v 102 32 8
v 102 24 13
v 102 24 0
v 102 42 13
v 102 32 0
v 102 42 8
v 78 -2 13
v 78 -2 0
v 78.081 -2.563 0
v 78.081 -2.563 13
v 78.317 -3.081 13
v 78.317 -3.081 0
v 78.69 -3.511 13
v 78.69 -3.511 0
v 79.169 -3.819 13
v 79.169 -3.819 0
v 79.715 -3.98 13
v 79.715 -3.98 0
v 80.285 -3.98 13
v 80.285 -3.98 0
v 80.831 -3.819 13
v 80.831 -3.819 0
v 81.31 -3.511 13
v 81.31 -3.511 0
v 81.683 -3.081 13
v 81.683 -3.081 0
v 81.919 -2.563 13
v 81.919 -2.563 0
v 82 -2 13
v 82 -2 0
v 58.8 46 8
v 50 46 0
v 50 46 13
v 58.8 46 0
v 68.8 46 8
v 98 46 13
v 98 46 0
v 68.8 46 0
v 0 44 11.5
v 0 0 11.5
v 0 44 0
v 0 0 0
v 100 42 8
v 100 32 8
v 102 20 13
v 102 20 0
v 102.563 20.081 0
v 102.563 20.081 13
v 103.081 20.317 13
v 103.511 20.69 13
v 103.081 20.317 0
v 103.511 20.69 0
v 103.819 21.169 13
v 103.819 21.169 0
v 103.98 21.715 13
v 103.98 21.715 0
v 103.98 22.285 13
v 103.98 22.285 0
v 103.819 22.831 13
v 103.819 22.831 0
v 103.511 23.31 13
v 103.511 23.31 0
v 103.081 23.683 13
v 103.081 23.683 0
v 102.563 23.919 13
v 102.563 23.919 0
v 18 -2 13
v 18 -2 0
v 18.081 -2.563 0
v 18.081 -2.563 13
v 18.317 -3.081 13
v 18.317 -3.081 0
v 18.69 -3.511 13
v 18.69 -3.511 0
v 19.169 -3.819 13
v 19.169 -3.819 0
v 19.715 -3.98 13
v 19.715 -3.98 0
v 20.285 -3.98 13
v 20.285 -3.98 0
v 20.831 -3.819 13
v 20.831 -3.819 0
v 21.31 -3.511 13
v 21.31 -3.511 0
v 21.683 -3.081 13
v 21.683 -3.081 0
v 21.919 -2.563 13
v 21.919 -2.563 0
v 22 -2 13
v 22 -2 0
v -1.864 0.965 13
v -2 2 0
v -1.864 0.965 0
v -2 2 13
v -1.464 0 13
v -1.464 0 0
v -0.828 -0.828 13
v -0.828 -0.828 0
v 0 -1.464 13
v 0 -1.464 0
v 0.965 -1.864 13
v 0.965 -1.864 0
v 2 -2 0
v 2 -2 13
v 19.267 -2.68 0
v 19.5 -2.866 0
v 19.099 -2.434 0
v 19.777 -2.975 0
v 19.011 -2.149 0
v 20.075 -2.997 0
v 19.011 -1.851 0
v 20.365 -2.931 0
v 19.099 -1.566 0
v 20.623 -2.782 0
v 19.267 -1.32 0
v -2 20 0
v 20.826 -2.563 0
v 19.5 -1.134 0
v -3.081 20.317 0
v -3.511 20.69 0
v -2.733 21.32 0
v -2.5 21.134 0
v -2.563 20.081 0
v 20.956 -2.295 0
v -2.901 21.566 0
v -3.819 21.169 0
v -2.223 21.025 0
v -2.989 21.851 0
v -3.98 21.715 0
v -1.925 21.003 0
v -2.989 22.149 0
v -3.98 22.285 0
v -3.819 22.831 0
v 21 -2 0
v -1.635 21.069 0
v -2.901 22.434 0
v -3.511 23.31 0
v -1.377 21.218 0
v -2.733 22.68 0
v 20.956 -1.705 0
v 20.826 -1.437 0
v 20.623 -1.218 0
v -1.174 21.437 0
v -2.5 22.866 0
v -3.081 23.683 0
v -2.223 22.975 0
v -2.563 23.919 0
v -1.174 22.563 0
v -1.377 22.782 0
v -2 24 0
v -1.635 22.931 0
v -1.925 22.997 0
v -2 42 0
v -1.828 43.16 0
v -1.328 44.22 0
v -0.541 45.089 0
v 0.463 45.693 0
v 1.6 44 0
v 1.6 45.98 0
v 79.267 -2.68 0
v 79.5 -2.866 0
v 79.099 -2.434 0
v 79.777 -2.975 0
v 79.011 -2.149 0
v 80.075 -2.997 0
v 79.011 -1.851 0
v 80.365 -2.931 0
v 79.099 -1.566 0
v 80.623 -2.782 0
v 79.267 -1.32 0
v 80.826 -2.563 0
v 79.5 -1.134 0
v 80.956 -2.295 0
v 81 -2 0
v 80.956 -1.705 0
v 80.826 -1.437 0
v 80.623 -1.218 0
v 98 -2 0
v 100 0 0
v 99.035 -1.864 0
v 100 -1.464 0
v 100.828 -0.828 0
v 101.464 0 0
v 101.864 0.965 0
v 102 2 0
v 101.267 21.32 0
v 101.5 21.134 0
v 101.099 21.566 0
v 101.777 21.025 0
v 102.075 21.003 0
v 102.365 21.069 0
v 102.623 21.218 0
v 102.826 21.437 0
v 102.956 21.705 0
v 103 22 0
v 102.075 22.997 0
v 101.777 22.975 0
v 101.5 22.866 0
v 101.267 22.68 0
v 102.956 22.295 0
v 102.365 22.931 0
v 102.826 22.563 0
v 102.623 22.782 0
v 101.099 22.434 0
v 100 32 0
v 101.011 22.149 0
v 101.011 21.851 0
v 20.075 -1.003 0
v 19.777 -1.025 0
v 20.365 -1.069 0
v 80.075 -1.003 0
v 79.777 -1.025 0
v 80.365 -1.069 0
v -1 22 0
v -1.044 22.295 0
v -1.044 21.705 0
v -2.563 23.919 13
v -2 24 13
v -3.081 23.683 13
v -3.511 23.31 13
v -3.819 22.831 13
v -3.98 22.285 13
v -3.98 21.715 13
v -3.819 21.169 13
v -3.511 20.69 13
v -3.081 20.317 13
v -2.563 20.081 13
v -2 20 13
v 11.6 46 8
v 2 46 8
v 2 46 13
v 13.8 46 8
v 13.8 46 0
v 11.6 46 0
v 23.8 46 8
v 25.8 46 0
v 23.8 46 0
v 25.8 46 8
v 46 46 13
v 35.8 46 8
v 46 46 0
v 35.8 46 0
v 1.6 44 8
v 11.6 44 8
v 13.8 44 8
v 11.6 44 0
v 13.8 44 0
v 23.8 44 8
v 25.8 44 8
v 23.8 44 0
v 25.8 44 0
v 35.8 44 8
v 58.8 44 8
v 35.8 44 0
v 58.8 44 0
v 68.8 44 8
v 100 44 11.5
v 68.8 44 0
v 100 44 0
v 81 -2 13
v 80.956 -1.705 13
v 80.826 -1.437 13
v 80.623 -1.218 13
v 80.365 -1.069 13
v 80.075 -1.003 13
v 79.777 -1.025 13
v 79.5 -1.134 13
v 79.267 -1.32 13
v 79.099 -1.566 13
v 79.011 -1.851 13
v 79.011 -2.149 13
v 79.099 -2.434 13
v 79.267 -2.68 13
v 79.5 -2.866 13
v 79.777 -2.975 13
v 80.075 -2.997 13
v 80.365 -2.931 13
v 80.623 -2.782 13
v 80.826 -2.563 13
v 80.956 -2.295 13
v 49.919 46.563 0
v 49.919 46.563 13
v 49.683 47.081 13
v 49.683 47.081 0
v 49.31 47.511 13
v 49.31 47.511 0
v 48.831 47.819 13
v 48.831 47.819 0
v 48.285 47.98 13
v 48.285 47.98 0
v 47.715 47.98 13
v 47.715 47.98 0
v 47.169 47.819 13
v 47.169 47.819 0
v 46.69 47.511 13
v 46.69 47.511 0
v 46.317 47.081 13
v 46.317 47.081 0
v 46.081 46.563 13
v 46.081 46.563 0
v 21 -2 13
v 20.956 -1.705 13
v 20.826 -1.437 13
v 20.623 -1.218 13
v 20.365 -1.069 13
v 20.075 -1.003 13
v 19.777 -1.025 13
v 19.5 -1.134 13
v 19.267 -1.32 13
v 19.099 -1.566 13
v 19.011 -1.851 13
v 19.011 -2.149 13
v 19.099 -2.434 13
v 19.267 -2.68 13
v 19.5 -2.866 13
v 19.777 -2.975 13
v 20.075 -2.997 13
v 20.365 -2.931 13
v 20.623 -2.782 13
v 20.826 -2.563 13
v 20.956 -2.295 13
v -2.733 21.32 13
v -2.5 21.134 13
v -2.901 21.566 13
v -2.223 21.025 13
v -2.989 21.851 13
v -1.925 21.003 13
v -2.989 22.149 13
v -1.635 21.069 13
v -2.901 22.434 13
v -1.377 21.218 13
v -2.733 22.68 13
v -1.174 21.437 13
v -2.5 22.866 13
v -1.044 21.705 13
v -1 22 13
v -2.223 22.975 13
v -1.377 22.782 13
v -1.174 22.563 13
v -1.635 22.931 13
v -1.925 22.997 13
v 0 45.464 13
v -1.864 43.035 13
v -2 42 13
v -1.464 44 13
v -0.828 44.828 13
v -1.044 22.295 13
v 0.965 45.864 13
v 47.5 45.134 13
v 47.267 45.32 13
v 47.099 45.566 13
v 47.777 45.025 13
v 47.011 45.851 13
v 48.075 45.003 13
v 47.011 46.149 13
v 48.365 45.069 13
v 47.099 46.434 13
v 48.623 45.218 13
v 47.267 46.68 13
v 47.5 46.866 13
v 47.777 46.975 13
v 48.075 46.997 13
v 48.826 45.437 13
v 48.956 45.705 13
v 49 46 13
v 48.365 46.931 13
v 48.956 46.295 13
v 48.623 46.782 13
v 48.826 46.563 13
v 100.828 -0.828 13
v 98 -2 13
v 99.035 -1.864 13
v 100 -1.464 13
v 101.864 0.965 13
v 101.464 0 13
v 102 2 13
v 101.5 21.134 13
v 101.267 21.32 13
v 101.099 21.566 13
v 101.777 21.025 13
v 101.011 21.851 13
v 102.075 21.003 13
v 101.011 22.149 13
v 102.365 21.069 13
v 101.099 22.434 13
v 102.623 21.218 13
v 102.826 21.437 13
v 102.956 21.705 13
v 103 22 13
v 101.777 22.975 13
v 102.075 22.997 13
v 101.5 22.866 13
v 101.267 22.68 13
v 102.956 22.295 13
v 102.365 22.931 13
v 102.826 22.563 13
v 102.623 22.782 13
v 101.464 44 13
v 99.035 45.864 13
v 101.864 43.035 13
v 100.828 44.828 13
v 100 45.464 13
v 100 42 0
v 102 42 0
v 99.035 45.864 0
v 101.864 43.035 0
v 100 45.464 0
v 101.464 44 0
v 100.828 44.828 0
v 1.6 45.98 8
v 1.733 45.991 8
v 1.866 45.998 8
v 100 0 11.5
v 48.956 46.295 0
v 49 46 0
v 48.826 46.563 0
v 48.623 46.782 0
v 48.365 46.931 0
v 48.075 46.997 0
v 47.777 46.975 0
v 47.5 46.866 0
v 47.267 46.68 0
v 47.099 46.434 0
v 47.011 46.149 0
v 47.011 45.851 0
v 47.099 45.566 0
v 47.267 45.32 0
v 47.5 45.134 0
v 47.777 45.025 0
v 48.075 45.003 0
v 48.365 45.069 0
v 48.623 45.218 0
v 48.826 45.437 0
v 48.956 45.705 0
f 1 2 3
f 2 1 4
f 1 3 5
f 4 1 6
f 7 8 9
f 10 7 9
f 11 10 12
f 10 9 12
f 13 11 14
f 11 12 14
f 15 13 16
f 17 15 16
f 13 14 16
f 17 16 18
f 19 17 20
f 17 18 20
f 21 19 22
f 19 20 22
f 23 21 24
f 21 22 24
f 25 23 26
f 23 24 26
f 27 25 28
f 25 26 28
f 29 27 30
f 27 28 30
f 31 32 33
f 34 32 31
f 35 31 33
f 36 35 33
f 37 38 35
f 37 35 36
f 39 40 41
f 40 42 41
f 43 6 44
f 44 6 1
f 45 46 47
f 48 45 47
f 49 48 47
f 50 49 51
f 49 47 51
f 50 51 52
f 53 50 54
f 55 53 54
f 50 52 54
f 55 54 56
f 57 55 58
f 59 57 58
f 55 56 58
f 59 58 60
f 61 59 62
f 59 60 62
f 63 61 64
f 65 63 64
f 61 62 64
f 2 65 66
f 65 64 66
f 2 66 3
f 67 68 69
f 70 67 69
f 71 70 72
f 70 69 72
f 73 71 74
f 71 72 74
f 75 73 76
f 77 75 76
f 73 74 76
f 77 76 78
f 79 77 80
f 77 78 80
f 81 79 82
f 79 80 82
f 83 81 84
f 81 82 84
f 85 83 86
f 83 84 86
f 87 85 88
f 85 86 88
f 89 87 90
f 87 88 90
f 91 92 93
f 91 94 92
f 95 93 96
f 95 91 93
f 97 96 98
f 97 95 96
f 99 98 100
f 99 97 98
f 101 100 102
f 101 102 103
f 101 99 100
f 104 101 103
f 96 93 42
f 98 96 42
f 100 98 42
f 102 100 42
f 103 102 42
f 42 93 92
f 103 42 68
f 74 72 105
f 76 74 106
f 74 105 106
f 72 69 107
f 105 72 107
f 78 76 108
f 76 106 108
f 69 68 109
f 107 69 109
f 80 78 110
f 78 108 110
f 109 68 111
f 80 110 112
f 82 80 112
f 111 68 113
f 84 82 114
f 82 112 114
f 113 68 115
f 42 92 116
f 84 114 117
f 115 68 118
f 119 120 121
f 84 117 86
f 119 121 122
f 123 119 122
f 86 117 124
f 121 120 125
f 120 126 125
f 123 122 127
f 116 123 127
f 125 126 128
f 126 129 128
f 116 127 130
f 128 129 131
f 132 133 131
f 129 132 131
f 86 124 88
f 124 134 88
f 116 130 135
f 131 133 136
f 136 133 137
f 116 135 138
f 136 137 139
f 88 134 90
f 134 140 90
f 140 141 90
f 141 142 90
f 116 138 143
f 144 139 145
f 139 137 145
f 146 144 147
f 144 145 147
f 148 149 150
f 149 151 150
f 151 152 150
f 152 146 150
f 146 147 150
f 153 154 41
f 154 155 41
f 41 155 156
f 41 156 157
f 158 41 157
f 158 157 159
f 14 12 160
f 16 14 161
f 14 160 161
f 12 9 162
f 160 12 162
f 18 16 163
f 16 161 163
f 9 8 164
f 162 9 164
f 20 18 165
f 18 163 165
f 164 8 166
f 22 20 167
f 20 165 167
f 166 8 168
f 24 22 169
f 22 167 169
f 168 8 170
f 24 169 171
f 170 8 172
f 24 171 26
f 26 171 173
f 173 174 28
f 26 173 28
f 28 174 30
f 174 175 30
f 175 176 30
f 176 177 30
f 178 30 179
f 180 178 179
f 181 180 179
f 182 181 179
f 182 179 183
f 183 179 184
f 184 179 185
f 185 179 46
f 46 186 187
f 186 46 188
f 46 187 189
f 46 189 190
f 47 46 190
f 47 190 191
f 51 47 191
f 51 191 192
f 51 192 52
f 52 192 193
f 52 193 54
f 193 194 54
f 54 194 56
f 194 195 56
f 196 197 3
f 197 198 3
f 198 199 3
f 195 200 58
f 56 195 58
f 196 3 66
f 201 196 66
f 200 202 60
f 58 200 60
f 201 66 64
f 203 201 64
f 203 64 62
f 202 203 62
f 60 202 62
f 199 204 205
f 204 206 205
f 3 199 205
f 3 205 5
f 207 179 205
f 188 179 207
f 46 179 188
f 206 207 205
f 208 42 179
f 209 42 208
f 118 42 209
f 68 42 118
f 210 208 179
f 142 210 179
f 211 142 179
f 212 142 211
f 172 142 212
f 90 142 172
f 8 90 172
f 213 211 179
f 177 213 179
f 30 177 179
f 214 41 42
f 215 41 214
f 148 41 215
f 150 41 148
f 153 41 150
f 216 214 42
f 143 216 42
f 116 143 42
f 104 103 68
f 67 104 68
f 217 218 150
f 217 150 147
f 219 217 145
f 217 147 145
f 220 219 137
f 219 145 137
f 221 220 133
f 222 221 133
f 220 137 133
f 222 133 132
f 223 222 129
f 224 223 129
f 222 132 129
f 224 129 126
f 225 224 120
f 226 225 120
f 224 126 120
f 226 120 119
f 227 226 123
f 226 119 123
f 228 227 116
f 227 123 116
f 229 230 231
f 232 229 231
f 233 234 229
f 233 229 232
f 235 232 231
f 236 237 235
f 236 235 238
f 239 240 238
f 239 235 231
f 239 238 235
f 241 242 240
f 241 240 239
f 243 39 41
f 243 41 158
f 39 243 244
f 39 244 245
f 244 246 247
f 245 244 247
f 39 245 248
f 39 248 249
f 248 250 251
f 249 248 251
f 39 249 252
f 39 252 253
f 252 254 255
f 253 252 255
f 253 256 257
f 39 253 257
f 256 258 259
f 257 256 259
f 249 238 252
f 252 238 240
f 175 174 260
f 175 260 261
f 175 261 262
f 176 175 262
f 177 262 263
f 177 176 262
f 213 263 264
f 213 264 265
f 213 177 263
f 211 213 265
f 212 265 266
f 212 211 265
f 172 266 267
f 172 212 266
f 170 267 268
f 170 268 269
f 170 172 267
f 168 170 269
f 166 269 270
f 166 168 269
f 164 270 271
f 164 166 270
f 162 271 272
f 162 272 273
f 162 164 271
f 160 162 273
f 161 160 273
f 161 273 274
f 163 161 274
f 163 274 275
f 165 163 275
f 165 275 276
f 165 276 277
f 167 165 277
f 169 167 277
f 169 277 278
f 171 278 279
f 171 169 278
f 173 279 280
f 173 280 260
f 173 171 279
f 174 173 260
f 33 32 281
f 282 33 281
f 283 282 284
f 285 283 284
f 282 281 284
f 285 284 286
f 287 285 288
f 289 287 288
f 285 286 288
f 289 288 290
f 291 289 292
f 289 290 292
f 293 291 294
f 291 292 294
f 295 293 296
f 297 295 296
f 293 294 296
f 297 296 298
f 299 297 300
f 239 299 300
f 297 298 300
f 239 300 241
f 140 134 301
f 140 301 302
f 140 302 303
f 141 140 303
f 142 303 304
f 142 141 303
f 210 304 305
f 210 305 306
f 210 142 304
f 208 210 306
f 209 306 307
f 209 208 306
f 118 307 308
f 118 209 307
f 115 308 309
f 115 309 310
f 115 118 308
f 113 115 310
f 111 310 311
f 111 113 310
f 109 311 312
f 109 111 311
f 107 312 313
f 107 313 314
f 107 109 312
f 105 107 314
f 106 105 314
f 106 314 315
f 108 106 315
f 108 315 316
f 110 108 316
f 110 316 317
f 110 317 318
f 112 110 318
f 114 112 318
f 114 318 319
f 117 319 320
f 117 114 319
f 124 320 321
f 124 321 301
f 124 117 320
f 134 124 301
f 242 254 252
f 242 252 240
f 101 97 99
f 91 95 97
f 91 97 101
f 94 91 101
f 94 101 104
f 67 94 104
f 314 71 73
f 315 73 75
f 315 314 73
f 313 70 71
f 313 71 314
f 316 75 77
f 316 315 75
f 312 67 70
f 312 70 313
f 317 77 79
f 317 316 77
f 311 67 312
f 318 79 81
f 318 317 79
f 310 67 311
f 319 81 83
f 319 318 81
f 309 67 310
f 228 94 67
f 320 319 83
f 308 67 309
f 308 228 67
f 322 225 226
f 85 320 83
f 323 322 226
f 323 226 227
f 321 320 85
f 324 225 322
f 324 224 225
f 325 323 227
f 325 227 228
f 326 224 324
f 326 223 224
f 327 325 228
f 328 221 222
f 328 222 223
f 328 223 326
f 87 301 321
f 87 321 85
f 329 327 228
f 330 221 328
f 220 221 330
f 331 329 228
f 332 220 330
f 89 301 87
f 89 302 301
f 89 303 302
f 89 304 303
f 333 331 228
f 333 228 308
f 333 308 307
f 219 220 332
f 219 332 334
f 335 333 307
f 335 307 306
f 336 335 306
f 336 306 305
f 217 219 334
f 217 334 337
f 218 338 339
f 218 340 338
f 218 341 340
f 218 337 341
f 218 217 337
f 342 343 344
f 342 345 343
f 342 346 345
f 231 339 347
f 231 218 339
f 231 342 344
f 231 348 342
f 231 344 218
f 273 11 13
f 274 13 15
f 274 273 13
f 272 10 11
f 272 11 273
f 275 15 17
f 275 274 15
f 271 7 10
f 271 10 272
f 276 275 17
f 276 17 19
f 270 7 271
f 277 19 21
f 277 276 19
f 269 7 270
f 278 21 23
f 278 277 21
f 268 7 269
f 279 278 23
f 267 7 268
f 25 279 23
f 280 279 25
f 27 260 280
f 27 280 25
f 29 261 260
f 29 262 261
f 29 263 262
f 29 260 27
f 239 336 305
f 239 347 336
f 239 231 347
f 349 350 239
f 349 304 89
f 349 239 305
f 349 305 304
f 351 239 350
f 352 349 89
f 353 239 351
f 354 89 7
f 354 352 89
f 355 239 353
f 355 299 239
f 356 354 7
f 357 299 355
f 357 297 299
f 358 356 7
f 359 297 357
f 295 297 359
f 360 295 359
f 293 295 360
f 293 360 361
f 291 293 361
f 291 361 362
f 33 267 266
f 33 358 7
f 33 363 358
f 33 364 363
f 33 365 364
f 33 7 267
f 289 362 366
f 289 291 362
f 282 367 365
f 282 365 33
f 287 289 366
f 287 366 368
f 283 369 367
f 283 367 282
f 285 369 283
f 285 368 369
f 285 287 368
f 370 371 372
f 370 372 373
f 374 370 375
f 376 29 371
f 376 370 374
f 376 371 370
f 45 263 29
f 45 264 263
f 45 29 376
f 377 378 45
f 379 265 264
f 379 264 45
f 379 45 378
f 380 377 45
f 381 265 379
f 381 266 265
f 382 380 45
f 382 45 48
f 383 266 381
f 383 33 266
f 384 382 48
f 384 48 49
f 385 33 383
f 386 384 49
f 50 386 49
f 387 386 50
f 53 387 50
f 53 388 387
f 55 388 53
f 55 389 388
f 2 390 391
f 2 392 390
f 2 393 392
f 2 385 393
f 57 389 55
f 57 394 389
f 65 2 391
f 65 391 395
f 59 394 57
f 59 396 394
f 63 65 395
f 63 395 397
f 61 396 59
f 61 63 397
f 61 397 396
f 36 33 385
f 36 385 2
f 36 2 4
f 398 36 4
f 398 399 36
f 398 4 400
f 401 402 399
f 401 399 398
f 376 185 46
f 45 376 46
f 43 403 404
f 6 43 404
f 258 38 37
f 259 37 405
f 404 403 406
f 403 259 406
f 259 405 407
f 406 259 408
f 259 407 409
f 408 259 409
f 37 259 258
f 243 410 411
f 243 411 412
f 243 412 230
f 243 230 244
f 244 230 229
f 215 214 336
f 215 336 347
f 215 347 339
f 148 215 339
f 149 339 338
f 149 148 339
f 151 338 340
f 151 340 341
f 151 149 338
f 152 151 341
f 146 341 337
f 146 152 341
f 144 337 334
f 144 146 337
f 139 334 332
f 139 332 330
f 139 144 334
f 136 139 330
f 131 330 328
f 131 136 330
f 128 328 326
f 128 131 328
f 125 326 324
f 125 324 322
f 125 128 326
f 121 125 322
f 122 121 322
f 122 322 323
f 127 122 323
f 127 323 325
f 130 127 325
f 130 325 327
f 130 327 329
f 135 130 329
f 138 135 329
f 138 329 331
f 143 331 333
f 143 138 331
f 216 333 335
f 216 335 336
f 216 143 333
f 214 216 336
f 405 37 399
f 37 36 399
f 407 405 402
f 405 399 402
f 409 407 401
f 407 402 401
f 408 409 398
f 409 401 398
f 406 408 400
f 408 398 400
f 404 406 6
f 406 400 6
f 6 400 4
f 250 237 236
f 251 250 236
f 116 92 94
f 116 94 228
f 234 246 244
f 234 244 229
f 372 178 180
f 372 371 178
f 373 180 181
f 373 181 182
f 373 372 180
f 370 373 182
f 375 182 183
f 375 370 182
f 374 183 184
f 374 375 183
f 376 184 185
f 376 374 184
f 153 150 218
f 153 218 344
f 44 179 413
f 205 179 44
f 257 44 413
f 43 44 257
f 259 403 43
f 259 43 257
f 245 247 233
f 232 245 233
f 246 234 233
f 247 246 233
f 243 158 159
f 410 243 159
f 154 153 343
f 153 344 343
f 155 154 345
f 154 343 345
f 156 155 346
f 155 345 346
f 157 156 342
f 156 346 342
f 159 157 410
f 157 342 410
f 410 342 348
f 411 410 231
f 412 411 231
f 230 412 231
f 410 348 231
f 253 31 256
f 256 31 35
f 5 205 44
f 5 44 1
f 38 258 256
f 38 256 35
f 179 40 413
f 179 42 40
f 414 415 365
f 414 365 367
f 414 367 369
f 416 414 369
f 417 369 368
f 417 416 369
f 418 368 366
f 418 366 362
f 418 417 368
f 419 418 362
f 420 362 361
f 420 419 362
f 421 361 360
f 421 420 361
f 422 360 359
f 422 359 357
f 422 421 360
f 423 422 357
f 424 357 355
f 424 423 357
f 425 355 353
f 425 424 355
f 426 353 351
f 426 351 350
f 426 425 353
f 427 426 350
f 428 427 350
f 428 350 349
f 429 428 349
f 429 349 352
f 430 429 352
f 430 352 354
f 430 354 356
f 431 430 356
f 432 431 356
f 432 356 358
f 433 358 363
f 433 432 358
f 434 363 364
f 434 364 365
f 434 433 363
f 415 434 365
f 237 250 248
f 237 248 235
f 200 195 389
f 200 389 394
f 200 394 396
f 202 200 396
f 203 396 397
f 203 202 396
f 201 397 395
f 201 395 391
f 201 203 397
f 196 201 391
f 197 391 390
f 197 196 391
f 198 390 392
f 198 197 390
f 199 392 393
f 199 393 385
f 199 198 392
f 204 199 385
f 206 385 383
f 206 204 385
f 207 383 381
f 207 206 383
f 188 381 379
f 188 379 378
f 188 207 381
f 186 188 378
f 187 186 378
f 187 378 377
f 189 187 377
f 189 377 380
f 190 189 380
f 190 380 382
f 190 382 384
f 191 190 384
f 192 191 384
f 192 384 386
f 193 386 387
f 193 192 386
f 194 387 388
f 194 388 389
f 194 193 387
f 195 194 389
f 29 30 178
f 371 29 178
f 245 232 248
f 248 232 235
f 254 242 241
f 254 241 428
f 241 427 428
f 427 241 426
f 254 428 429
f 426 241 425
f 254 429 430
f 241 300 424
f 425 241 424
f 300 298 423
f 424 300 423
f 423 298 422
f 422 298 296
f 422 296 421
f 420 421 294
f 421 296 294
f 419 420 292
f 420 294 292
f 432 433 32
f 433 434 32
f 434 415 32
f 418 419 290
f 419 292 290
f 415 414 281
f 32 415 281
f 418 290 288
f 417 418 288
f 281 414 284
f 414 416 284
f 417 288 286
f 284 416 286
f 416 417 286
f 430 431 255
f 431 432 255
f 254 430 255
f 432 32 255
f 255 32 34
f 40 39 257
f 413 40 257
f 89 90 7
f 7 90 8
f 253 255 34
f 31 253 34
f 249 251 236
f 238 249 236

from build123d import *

# Parameters (mm, degrees)
CYLINDER006_R     = 1
CYLINDER006_DEPTH = 13
CYLINDER007_R     = 1
CYLINDER007_DEPTH = 13
CYLINDER008_R     = 1
CYLINDER008_DEPTH = 13
CYLINDER005_R     = 1
CYLINDER005_DEPTH = 13
CYLINDER009_R     = 1
CYLINDER009_DEPTH = 13
CYLINDER001_R     = 2
CYLINDER001_DEPTH = 13
CYLINDER002_R     = 2
CYLINDER002_DEPTH = 13
CYLINDER003_R     = 2
CYLINDER003_DEPTH = 13
CYLINDER004_R     = 2
CYLINDER004_DEPTH = 13
BOX001_W          = 10
BOX001_H          = 17
BOX001_DEPTH      = 8
BOX002_W          = 10
BOX002_H          = 17
BOX002_DEPTH      = 8
BOX003_W          = 10
BOX003_H          = 17
BOX003_DEPTH      = 8
BOX004_W          = 10
BOX004_H          = 17
BOX004_DEPTH      = 8
BOX005_W          = 10
BOX005_H          = 17
BOX005_DEPTH      = 8
BOX_W             = 100
BOX_H             = 44
BOX_DEPTH         = 16.5
BOX006_W          = 104
BOX006_H          = 48
BOX006_DEPTH      = 13
FILLET_R          = 4
CYLINDER_R        = 2
CYLINDER_DEPTH    = 13


with BuildPart() as cylinder006:
    # Cylinder006 → Cylinder006 (new body)
    with BuildSketch(Plane(origin=(20, -2, 0), x_dir=(1, 0, 0), z_dir=(0, 0, 1))):
        Circle(CYLINDER006_R)
    extrude(amount=CYLINDER006_DEPTH)


with BuildPart() as cylinder007:
    # Cylinder007 → Cylinder007 (new body)
    with BuildSketch(Plane(origin=(80, -2, 0), x_dir=(1, 0, 0), z_dir=(0, 0, 1))):
        Circle(CYLINDER007_R)
    extrude(amount=CYLINDER007_DEPTH)


with BuildPart() as cylinder008:
    # Cylinder008 → Cylinder008 (new body)
    with BuildSketch(Plane(origin=(48, 46, 0), x_dir=(1, 0, 0), z_dir=(0, 0, 1))):
        Circle(CYLINDER008_R)
    extrude(amount=CYLINDER008_DEPTH)


with BuildPart() as cylinder005:
    # Cylinder005 → Cylinder005 (new body)
    with BuildSketch(Plane(origin=(-2, 22, 0), x_dir=(1, 0, 0), z_dir=(0, 0, 1))):
        Circle(CYLINDER005_R)
    extrude(amount=CYLINDER005_DEPTH)


with BuildPart() as cylinder009:
    # Cylinder009 → Cylinder009 (new body)
    with BuildSketch(Plane(origin=(102, 22, 0), x_dir=(1, 0, 0), z_dir=(0, 0, 1))):
        Circle(CYLINDER009_R)
    extrude(amount=CYLINDER009_DEPTH)


with BuildPart() as cylinder001:
    # Cylinder001 → Cylinder001 (new body)
    with BuildSketch(Plane(origin=(80, -2, 0), x_dir=(1, 0, 0), z_dir=(0, 0, 1))):
        Circle(CYLINDER001_R)
    extrude(amount=CYLINDER001_DEPTH)


with BuildPart() as cylinder002:
    # Cylinder002 → Cylinder002 (new body)
    with BuildSketch(Plane(origin=(48, 46, 0), x_dir=(1, 0, 0), z_dir=(0, 0, 1))):
        Circle(CYLINDER002_R)
    extrude(amount=CYLINDER002_DEPTH)


with BuildPart() as cylinder003:
    # Cylinder003 → Cylinder003 (new body)
    with BuildSketch(Plane(origin=(-2, 22, 0), x_dir=(1, 0, 0), z_dir=(0, 0, 1))):
        Circle(CYLINDER003_R)
    extrude(amount=CYLINDER003_DEPTH)


with BuildPart() as cylinder004:
    # Cylinder004 → Cylinder004 (new body)
    with BuildSketch(Plane(origin=(102, 22, 0), x_dir=(1, 0, 0), z_dir=(0, 0, 1))):
        Circle(CYLINDER004_R)
    extrude(amount=CYLINDER004_DEPTH)


with BuildPart() as box001:
    # Box001 → Box001 (new body)
    with BuildSketch(Plane(origin=(1.6, 37, 0), x_dir=(1, 0, 0), z_dir=(0, 0, 1))):
        with Locations((5, 8.5)):
            Rectangle(BOX001_W, BOX001_H)
    extrude(amount=BOX001_DEPTH)


with BuildPart() as box002:
    # Box002 → Box002 (new body)
    with BuildSketch(Plane(origin=(13.8, 37, 0), x_dir=(1, 0, 0), z_dir=(0, 0, 1))):
        with Locations((5, 8.5)):
            Rectangle(BOX002_W, BOX002_H)
    extrude(amount=BOX002_DEPTH)


with BuildPart() as box003:
    # Box003 → Box003 (new body)
    with BuildSketch(Plane(origin=(25.8, 37, 0), x_dir=(1, 0, 0), z_dir=(0, 0, 1))):
        with Locations((5, 8.5)):
            Rectangle(BOX003_W, BOX003_H)
    extrude(amount=BOX003_DEPTH)


with BuildPart() as box004:
    # Box004 → Box004 (new body)
    with BuildSketch(Plane(origin=(58.8, 37, 0), x_dir=(1, 0, 0), z_dir=(0, 0, 1))):
        with Locations((5, 8.5)):
            Rectangle(BOX004_W, BOX004_H)
    extrude(amount=BOX004_DEPTH)


with BuildPart() as box005:
    # Box005 → Box005 (new body)
    with BuildSketch(Plane(origin=(93.8, 42, 0), x_dir=(0, -1, 0), z_dir=(0, 0, 1))):
        with Locations((5, 8.5)):
            Rectangle(BOX005_W, BOX005_H)
    extrude(amount=BOX005_DEPTH)


with BuildPart() as fusion:
    # Box → Box (new body)
    with BuildSketch(Plane.XY.offset(-5)):
        with Locations((50, 22)):
            Rectangle(BOX_W, BOX_H)
    extrude(amount=BOX_DEPTH)

    # Fusion: union Box001, Box002, Box003, Box004, Box005
    add(box001.part)
    add(box002.part)
    add(box003.part)
    add(box004.part)
    add(box005.part)


with BuildPart() as fillet_body:
    # Box006 → Box006 (new body)
    with BuildSketch(Plane(origin=(-2, -2, 0), x_dir=(1, 0, 0), z_dir=(0, 0, 1))):
        with Locations((52, 24)):
            Rectangle(BOX006_W, BOX006_H)
    extrude(amount=BOX006_DEPTH)

    # Cut: cut Fusion
    add(fusion.part, mode=Mode.SUBTRACT)

    # Fillet
    fillet_edges = [fillet_body.edges().sort_by_distance(p)[0] for p in [
        (-2, -2, 6.5),
        (-2, 46, 6.5),
        (102, -2, 6.5),
        (102, 46, 6.5),
    ]]
    fillet(fillet_edges, radius=FILLET_R)


with BuildPart() as cut006:
    # Cylinder → Cylinder (new body)
    with BuildSketch(Plane(origin=(20, -2, 0), x_dir=(1, 0, 0), z_dir=(0, 0, 1))):
        Circle(CYLINDER_R)
    extrude(amount=CYLINDER_DEPTH)

    # Fusion002: union Cylinder001, Cylinder002, Cylinder003, Cylinder004, Fillet body
    add(cylinder001.part)
    add(cylinder002.part)
    add(cylinder003.part)
    add(cylinder004.part)
    add(fillet_body.part)

    # Cut002: cut Cylinder009
    add(cylinder009.part, mode=Mode.SUBTRACT)

    # Cut003: cut Cylinder005
    add(cylinder005.part, mode=Mode.SUBTRACT)

    # Cut004: cut Cylinder008
    add(cylinder008.part, mode=Mode.SUBTRACT)

    # Cut005: cut Cylinder007
    add(cylinder007.part, mode=Mode.SUBTRACT)

    # Cut006: cut Cylinder006
    add(cylinder006.part, mode=Mode.SUBTRACT)


solid = cut006.part
